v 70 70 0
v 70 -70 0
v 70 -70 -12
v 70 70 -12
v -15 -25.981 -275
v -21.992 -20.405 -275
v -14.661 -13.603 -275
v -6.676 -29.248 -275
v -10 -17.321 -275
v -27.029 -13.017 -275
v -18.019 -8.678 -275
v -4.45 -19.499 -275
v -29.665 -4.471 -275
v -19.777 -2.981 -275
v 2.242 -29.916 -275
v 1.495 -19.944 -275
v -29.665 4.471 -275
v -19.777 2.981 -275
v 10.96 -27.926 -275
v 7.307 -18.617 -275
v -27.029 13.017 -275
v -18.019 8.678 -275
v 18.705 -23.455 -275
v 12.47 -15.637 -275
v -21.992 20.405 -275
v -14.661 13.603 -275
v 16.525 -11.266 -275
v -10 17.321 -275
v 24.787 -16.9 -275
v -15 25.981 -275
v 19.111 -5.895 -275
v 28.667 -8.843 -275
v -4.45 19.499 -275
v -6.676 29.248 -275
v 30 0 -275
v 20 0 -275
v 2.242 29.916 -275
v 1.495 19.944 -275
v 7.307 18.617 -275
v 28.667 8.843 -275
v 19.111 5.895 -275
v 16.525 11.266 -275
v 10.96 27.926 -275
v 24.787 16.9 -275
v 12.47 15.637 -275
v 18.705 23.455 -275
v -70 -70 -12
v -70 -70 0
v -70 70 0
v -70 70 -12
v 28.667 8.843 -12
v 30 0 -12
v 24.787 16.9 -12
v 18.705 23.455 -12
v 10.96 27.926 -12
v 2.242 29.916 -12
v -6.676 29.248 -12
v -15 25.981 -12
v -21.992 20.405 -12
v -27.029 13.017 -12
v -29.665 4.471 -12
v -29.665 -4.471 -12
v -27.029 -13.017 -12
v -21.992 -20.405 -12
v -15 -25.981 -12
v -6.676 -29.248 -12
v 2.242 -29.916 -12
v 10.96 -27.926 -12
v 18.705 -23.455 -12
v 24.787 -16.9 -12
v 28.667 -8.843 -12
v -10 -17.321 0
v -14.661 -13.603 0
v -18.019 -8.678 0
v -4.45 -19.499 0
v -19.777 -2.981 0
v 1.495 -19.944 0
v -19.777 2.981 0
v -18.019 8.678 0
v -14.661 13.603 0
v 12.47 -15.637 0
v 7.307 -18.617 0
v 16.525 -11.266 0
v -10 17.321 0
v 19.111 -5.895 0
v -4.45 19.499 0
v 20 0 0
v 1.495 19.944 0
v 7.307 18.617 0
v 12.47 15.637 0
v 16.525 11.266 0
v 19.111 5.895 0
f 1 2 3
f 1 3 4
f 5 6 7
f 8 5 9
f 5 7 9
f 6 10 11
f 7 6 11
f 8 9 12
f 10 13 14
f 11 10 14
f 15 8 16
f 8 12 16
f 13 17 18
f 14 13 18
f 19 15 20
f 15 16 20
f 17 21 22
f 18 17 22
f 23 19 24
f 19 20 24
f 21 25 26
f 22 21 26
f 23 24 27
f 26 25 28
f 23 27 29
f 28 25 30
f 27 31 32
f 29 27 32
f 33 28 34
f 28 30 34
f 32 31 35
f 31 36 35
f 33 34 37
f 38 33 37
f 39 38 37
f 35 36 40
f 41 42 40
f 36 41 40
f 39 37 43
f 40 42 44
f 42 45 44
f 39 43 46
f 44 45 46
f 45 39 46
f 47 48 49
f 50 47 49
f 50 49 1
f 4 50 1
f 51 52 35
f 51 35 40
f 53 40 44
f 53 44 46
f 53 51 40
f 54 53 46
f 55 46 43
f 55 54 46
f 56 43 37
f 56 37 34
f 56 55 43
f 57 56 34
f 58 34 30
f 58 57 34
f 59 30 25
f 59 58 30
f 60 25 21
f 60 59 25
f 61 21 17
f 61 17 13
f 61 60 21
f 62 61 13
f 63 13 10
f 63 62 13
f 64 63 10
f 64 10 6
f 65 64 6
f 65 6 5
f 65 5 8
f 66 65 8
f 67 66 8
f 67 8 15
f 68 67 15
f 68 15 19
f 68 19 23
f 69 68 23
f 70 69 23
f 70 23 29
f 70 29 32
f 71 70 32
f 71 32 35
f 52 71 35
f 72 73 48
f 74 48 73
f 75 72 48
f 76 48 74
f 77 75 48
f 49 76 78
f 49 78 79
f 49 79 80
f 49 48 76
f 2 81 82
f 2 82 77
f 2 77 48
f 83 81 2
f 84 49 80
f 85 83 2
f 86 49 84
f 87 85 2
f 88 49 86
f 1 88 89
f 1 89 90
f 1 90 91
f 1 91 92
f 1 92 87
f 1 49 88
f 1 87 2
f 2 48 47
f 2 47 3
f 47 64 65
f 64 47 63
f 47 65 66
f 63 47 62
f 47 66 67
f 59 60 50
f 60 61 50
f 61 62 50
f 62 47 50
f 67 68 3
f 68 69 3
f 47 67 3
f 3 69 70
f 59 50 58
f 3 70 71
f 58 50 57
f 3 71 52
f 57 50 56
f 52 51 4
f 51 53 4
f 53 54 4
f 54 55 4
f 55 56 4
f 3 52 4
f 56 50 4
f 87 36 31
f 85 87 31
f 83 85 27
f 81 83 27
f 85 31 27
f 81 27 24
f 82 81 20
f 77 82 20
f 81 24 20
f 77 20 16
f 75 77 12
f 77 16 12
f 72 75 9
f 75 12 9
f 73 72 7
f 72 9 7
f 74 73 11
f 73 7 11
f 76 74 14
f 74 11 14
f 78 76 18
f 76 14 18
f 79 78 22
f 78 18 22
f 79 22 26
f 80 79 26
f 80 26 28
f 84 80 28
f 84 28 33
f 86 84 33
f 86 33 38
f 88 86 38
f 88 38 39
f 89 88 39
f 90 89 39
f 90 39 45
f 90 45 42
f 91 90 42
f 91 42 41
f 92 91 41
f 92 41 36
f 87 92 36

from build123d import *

# Parameters (mm, degrees)
F0_W     = 140
F0_H     = 140
F1_DEPTH = 12
F2_R     = 30
F3_DEPTH = 275
F4_R     = 20
F5_DEPTH = 275.001


with BuildPart() as f1:
    # F0 (on Top) → F1 (new body)
    with BuildSketch(Plane.XY):
        Rectangle(F0_W, F0_H)
    extrude(amount=-F1_DEPTH)

    # F2 (on face) → F3 (join)
    with BuildSketch(Plane.XY):
        Circle(F2_R)
    extrude(amount=-F3_DEPTH)

    # F4 (on face) → F5 (cut, through all)
    with BuildSketch(Plane(origin=(0, 0, -275), x_dir=(1, 0, 0), z_dir=(0, 0, -1))):
        Circle(F4_R)
    extrude(amount=-F5_DEPTH, mode=Mode.SUBTRACT)


solid = f1.part
